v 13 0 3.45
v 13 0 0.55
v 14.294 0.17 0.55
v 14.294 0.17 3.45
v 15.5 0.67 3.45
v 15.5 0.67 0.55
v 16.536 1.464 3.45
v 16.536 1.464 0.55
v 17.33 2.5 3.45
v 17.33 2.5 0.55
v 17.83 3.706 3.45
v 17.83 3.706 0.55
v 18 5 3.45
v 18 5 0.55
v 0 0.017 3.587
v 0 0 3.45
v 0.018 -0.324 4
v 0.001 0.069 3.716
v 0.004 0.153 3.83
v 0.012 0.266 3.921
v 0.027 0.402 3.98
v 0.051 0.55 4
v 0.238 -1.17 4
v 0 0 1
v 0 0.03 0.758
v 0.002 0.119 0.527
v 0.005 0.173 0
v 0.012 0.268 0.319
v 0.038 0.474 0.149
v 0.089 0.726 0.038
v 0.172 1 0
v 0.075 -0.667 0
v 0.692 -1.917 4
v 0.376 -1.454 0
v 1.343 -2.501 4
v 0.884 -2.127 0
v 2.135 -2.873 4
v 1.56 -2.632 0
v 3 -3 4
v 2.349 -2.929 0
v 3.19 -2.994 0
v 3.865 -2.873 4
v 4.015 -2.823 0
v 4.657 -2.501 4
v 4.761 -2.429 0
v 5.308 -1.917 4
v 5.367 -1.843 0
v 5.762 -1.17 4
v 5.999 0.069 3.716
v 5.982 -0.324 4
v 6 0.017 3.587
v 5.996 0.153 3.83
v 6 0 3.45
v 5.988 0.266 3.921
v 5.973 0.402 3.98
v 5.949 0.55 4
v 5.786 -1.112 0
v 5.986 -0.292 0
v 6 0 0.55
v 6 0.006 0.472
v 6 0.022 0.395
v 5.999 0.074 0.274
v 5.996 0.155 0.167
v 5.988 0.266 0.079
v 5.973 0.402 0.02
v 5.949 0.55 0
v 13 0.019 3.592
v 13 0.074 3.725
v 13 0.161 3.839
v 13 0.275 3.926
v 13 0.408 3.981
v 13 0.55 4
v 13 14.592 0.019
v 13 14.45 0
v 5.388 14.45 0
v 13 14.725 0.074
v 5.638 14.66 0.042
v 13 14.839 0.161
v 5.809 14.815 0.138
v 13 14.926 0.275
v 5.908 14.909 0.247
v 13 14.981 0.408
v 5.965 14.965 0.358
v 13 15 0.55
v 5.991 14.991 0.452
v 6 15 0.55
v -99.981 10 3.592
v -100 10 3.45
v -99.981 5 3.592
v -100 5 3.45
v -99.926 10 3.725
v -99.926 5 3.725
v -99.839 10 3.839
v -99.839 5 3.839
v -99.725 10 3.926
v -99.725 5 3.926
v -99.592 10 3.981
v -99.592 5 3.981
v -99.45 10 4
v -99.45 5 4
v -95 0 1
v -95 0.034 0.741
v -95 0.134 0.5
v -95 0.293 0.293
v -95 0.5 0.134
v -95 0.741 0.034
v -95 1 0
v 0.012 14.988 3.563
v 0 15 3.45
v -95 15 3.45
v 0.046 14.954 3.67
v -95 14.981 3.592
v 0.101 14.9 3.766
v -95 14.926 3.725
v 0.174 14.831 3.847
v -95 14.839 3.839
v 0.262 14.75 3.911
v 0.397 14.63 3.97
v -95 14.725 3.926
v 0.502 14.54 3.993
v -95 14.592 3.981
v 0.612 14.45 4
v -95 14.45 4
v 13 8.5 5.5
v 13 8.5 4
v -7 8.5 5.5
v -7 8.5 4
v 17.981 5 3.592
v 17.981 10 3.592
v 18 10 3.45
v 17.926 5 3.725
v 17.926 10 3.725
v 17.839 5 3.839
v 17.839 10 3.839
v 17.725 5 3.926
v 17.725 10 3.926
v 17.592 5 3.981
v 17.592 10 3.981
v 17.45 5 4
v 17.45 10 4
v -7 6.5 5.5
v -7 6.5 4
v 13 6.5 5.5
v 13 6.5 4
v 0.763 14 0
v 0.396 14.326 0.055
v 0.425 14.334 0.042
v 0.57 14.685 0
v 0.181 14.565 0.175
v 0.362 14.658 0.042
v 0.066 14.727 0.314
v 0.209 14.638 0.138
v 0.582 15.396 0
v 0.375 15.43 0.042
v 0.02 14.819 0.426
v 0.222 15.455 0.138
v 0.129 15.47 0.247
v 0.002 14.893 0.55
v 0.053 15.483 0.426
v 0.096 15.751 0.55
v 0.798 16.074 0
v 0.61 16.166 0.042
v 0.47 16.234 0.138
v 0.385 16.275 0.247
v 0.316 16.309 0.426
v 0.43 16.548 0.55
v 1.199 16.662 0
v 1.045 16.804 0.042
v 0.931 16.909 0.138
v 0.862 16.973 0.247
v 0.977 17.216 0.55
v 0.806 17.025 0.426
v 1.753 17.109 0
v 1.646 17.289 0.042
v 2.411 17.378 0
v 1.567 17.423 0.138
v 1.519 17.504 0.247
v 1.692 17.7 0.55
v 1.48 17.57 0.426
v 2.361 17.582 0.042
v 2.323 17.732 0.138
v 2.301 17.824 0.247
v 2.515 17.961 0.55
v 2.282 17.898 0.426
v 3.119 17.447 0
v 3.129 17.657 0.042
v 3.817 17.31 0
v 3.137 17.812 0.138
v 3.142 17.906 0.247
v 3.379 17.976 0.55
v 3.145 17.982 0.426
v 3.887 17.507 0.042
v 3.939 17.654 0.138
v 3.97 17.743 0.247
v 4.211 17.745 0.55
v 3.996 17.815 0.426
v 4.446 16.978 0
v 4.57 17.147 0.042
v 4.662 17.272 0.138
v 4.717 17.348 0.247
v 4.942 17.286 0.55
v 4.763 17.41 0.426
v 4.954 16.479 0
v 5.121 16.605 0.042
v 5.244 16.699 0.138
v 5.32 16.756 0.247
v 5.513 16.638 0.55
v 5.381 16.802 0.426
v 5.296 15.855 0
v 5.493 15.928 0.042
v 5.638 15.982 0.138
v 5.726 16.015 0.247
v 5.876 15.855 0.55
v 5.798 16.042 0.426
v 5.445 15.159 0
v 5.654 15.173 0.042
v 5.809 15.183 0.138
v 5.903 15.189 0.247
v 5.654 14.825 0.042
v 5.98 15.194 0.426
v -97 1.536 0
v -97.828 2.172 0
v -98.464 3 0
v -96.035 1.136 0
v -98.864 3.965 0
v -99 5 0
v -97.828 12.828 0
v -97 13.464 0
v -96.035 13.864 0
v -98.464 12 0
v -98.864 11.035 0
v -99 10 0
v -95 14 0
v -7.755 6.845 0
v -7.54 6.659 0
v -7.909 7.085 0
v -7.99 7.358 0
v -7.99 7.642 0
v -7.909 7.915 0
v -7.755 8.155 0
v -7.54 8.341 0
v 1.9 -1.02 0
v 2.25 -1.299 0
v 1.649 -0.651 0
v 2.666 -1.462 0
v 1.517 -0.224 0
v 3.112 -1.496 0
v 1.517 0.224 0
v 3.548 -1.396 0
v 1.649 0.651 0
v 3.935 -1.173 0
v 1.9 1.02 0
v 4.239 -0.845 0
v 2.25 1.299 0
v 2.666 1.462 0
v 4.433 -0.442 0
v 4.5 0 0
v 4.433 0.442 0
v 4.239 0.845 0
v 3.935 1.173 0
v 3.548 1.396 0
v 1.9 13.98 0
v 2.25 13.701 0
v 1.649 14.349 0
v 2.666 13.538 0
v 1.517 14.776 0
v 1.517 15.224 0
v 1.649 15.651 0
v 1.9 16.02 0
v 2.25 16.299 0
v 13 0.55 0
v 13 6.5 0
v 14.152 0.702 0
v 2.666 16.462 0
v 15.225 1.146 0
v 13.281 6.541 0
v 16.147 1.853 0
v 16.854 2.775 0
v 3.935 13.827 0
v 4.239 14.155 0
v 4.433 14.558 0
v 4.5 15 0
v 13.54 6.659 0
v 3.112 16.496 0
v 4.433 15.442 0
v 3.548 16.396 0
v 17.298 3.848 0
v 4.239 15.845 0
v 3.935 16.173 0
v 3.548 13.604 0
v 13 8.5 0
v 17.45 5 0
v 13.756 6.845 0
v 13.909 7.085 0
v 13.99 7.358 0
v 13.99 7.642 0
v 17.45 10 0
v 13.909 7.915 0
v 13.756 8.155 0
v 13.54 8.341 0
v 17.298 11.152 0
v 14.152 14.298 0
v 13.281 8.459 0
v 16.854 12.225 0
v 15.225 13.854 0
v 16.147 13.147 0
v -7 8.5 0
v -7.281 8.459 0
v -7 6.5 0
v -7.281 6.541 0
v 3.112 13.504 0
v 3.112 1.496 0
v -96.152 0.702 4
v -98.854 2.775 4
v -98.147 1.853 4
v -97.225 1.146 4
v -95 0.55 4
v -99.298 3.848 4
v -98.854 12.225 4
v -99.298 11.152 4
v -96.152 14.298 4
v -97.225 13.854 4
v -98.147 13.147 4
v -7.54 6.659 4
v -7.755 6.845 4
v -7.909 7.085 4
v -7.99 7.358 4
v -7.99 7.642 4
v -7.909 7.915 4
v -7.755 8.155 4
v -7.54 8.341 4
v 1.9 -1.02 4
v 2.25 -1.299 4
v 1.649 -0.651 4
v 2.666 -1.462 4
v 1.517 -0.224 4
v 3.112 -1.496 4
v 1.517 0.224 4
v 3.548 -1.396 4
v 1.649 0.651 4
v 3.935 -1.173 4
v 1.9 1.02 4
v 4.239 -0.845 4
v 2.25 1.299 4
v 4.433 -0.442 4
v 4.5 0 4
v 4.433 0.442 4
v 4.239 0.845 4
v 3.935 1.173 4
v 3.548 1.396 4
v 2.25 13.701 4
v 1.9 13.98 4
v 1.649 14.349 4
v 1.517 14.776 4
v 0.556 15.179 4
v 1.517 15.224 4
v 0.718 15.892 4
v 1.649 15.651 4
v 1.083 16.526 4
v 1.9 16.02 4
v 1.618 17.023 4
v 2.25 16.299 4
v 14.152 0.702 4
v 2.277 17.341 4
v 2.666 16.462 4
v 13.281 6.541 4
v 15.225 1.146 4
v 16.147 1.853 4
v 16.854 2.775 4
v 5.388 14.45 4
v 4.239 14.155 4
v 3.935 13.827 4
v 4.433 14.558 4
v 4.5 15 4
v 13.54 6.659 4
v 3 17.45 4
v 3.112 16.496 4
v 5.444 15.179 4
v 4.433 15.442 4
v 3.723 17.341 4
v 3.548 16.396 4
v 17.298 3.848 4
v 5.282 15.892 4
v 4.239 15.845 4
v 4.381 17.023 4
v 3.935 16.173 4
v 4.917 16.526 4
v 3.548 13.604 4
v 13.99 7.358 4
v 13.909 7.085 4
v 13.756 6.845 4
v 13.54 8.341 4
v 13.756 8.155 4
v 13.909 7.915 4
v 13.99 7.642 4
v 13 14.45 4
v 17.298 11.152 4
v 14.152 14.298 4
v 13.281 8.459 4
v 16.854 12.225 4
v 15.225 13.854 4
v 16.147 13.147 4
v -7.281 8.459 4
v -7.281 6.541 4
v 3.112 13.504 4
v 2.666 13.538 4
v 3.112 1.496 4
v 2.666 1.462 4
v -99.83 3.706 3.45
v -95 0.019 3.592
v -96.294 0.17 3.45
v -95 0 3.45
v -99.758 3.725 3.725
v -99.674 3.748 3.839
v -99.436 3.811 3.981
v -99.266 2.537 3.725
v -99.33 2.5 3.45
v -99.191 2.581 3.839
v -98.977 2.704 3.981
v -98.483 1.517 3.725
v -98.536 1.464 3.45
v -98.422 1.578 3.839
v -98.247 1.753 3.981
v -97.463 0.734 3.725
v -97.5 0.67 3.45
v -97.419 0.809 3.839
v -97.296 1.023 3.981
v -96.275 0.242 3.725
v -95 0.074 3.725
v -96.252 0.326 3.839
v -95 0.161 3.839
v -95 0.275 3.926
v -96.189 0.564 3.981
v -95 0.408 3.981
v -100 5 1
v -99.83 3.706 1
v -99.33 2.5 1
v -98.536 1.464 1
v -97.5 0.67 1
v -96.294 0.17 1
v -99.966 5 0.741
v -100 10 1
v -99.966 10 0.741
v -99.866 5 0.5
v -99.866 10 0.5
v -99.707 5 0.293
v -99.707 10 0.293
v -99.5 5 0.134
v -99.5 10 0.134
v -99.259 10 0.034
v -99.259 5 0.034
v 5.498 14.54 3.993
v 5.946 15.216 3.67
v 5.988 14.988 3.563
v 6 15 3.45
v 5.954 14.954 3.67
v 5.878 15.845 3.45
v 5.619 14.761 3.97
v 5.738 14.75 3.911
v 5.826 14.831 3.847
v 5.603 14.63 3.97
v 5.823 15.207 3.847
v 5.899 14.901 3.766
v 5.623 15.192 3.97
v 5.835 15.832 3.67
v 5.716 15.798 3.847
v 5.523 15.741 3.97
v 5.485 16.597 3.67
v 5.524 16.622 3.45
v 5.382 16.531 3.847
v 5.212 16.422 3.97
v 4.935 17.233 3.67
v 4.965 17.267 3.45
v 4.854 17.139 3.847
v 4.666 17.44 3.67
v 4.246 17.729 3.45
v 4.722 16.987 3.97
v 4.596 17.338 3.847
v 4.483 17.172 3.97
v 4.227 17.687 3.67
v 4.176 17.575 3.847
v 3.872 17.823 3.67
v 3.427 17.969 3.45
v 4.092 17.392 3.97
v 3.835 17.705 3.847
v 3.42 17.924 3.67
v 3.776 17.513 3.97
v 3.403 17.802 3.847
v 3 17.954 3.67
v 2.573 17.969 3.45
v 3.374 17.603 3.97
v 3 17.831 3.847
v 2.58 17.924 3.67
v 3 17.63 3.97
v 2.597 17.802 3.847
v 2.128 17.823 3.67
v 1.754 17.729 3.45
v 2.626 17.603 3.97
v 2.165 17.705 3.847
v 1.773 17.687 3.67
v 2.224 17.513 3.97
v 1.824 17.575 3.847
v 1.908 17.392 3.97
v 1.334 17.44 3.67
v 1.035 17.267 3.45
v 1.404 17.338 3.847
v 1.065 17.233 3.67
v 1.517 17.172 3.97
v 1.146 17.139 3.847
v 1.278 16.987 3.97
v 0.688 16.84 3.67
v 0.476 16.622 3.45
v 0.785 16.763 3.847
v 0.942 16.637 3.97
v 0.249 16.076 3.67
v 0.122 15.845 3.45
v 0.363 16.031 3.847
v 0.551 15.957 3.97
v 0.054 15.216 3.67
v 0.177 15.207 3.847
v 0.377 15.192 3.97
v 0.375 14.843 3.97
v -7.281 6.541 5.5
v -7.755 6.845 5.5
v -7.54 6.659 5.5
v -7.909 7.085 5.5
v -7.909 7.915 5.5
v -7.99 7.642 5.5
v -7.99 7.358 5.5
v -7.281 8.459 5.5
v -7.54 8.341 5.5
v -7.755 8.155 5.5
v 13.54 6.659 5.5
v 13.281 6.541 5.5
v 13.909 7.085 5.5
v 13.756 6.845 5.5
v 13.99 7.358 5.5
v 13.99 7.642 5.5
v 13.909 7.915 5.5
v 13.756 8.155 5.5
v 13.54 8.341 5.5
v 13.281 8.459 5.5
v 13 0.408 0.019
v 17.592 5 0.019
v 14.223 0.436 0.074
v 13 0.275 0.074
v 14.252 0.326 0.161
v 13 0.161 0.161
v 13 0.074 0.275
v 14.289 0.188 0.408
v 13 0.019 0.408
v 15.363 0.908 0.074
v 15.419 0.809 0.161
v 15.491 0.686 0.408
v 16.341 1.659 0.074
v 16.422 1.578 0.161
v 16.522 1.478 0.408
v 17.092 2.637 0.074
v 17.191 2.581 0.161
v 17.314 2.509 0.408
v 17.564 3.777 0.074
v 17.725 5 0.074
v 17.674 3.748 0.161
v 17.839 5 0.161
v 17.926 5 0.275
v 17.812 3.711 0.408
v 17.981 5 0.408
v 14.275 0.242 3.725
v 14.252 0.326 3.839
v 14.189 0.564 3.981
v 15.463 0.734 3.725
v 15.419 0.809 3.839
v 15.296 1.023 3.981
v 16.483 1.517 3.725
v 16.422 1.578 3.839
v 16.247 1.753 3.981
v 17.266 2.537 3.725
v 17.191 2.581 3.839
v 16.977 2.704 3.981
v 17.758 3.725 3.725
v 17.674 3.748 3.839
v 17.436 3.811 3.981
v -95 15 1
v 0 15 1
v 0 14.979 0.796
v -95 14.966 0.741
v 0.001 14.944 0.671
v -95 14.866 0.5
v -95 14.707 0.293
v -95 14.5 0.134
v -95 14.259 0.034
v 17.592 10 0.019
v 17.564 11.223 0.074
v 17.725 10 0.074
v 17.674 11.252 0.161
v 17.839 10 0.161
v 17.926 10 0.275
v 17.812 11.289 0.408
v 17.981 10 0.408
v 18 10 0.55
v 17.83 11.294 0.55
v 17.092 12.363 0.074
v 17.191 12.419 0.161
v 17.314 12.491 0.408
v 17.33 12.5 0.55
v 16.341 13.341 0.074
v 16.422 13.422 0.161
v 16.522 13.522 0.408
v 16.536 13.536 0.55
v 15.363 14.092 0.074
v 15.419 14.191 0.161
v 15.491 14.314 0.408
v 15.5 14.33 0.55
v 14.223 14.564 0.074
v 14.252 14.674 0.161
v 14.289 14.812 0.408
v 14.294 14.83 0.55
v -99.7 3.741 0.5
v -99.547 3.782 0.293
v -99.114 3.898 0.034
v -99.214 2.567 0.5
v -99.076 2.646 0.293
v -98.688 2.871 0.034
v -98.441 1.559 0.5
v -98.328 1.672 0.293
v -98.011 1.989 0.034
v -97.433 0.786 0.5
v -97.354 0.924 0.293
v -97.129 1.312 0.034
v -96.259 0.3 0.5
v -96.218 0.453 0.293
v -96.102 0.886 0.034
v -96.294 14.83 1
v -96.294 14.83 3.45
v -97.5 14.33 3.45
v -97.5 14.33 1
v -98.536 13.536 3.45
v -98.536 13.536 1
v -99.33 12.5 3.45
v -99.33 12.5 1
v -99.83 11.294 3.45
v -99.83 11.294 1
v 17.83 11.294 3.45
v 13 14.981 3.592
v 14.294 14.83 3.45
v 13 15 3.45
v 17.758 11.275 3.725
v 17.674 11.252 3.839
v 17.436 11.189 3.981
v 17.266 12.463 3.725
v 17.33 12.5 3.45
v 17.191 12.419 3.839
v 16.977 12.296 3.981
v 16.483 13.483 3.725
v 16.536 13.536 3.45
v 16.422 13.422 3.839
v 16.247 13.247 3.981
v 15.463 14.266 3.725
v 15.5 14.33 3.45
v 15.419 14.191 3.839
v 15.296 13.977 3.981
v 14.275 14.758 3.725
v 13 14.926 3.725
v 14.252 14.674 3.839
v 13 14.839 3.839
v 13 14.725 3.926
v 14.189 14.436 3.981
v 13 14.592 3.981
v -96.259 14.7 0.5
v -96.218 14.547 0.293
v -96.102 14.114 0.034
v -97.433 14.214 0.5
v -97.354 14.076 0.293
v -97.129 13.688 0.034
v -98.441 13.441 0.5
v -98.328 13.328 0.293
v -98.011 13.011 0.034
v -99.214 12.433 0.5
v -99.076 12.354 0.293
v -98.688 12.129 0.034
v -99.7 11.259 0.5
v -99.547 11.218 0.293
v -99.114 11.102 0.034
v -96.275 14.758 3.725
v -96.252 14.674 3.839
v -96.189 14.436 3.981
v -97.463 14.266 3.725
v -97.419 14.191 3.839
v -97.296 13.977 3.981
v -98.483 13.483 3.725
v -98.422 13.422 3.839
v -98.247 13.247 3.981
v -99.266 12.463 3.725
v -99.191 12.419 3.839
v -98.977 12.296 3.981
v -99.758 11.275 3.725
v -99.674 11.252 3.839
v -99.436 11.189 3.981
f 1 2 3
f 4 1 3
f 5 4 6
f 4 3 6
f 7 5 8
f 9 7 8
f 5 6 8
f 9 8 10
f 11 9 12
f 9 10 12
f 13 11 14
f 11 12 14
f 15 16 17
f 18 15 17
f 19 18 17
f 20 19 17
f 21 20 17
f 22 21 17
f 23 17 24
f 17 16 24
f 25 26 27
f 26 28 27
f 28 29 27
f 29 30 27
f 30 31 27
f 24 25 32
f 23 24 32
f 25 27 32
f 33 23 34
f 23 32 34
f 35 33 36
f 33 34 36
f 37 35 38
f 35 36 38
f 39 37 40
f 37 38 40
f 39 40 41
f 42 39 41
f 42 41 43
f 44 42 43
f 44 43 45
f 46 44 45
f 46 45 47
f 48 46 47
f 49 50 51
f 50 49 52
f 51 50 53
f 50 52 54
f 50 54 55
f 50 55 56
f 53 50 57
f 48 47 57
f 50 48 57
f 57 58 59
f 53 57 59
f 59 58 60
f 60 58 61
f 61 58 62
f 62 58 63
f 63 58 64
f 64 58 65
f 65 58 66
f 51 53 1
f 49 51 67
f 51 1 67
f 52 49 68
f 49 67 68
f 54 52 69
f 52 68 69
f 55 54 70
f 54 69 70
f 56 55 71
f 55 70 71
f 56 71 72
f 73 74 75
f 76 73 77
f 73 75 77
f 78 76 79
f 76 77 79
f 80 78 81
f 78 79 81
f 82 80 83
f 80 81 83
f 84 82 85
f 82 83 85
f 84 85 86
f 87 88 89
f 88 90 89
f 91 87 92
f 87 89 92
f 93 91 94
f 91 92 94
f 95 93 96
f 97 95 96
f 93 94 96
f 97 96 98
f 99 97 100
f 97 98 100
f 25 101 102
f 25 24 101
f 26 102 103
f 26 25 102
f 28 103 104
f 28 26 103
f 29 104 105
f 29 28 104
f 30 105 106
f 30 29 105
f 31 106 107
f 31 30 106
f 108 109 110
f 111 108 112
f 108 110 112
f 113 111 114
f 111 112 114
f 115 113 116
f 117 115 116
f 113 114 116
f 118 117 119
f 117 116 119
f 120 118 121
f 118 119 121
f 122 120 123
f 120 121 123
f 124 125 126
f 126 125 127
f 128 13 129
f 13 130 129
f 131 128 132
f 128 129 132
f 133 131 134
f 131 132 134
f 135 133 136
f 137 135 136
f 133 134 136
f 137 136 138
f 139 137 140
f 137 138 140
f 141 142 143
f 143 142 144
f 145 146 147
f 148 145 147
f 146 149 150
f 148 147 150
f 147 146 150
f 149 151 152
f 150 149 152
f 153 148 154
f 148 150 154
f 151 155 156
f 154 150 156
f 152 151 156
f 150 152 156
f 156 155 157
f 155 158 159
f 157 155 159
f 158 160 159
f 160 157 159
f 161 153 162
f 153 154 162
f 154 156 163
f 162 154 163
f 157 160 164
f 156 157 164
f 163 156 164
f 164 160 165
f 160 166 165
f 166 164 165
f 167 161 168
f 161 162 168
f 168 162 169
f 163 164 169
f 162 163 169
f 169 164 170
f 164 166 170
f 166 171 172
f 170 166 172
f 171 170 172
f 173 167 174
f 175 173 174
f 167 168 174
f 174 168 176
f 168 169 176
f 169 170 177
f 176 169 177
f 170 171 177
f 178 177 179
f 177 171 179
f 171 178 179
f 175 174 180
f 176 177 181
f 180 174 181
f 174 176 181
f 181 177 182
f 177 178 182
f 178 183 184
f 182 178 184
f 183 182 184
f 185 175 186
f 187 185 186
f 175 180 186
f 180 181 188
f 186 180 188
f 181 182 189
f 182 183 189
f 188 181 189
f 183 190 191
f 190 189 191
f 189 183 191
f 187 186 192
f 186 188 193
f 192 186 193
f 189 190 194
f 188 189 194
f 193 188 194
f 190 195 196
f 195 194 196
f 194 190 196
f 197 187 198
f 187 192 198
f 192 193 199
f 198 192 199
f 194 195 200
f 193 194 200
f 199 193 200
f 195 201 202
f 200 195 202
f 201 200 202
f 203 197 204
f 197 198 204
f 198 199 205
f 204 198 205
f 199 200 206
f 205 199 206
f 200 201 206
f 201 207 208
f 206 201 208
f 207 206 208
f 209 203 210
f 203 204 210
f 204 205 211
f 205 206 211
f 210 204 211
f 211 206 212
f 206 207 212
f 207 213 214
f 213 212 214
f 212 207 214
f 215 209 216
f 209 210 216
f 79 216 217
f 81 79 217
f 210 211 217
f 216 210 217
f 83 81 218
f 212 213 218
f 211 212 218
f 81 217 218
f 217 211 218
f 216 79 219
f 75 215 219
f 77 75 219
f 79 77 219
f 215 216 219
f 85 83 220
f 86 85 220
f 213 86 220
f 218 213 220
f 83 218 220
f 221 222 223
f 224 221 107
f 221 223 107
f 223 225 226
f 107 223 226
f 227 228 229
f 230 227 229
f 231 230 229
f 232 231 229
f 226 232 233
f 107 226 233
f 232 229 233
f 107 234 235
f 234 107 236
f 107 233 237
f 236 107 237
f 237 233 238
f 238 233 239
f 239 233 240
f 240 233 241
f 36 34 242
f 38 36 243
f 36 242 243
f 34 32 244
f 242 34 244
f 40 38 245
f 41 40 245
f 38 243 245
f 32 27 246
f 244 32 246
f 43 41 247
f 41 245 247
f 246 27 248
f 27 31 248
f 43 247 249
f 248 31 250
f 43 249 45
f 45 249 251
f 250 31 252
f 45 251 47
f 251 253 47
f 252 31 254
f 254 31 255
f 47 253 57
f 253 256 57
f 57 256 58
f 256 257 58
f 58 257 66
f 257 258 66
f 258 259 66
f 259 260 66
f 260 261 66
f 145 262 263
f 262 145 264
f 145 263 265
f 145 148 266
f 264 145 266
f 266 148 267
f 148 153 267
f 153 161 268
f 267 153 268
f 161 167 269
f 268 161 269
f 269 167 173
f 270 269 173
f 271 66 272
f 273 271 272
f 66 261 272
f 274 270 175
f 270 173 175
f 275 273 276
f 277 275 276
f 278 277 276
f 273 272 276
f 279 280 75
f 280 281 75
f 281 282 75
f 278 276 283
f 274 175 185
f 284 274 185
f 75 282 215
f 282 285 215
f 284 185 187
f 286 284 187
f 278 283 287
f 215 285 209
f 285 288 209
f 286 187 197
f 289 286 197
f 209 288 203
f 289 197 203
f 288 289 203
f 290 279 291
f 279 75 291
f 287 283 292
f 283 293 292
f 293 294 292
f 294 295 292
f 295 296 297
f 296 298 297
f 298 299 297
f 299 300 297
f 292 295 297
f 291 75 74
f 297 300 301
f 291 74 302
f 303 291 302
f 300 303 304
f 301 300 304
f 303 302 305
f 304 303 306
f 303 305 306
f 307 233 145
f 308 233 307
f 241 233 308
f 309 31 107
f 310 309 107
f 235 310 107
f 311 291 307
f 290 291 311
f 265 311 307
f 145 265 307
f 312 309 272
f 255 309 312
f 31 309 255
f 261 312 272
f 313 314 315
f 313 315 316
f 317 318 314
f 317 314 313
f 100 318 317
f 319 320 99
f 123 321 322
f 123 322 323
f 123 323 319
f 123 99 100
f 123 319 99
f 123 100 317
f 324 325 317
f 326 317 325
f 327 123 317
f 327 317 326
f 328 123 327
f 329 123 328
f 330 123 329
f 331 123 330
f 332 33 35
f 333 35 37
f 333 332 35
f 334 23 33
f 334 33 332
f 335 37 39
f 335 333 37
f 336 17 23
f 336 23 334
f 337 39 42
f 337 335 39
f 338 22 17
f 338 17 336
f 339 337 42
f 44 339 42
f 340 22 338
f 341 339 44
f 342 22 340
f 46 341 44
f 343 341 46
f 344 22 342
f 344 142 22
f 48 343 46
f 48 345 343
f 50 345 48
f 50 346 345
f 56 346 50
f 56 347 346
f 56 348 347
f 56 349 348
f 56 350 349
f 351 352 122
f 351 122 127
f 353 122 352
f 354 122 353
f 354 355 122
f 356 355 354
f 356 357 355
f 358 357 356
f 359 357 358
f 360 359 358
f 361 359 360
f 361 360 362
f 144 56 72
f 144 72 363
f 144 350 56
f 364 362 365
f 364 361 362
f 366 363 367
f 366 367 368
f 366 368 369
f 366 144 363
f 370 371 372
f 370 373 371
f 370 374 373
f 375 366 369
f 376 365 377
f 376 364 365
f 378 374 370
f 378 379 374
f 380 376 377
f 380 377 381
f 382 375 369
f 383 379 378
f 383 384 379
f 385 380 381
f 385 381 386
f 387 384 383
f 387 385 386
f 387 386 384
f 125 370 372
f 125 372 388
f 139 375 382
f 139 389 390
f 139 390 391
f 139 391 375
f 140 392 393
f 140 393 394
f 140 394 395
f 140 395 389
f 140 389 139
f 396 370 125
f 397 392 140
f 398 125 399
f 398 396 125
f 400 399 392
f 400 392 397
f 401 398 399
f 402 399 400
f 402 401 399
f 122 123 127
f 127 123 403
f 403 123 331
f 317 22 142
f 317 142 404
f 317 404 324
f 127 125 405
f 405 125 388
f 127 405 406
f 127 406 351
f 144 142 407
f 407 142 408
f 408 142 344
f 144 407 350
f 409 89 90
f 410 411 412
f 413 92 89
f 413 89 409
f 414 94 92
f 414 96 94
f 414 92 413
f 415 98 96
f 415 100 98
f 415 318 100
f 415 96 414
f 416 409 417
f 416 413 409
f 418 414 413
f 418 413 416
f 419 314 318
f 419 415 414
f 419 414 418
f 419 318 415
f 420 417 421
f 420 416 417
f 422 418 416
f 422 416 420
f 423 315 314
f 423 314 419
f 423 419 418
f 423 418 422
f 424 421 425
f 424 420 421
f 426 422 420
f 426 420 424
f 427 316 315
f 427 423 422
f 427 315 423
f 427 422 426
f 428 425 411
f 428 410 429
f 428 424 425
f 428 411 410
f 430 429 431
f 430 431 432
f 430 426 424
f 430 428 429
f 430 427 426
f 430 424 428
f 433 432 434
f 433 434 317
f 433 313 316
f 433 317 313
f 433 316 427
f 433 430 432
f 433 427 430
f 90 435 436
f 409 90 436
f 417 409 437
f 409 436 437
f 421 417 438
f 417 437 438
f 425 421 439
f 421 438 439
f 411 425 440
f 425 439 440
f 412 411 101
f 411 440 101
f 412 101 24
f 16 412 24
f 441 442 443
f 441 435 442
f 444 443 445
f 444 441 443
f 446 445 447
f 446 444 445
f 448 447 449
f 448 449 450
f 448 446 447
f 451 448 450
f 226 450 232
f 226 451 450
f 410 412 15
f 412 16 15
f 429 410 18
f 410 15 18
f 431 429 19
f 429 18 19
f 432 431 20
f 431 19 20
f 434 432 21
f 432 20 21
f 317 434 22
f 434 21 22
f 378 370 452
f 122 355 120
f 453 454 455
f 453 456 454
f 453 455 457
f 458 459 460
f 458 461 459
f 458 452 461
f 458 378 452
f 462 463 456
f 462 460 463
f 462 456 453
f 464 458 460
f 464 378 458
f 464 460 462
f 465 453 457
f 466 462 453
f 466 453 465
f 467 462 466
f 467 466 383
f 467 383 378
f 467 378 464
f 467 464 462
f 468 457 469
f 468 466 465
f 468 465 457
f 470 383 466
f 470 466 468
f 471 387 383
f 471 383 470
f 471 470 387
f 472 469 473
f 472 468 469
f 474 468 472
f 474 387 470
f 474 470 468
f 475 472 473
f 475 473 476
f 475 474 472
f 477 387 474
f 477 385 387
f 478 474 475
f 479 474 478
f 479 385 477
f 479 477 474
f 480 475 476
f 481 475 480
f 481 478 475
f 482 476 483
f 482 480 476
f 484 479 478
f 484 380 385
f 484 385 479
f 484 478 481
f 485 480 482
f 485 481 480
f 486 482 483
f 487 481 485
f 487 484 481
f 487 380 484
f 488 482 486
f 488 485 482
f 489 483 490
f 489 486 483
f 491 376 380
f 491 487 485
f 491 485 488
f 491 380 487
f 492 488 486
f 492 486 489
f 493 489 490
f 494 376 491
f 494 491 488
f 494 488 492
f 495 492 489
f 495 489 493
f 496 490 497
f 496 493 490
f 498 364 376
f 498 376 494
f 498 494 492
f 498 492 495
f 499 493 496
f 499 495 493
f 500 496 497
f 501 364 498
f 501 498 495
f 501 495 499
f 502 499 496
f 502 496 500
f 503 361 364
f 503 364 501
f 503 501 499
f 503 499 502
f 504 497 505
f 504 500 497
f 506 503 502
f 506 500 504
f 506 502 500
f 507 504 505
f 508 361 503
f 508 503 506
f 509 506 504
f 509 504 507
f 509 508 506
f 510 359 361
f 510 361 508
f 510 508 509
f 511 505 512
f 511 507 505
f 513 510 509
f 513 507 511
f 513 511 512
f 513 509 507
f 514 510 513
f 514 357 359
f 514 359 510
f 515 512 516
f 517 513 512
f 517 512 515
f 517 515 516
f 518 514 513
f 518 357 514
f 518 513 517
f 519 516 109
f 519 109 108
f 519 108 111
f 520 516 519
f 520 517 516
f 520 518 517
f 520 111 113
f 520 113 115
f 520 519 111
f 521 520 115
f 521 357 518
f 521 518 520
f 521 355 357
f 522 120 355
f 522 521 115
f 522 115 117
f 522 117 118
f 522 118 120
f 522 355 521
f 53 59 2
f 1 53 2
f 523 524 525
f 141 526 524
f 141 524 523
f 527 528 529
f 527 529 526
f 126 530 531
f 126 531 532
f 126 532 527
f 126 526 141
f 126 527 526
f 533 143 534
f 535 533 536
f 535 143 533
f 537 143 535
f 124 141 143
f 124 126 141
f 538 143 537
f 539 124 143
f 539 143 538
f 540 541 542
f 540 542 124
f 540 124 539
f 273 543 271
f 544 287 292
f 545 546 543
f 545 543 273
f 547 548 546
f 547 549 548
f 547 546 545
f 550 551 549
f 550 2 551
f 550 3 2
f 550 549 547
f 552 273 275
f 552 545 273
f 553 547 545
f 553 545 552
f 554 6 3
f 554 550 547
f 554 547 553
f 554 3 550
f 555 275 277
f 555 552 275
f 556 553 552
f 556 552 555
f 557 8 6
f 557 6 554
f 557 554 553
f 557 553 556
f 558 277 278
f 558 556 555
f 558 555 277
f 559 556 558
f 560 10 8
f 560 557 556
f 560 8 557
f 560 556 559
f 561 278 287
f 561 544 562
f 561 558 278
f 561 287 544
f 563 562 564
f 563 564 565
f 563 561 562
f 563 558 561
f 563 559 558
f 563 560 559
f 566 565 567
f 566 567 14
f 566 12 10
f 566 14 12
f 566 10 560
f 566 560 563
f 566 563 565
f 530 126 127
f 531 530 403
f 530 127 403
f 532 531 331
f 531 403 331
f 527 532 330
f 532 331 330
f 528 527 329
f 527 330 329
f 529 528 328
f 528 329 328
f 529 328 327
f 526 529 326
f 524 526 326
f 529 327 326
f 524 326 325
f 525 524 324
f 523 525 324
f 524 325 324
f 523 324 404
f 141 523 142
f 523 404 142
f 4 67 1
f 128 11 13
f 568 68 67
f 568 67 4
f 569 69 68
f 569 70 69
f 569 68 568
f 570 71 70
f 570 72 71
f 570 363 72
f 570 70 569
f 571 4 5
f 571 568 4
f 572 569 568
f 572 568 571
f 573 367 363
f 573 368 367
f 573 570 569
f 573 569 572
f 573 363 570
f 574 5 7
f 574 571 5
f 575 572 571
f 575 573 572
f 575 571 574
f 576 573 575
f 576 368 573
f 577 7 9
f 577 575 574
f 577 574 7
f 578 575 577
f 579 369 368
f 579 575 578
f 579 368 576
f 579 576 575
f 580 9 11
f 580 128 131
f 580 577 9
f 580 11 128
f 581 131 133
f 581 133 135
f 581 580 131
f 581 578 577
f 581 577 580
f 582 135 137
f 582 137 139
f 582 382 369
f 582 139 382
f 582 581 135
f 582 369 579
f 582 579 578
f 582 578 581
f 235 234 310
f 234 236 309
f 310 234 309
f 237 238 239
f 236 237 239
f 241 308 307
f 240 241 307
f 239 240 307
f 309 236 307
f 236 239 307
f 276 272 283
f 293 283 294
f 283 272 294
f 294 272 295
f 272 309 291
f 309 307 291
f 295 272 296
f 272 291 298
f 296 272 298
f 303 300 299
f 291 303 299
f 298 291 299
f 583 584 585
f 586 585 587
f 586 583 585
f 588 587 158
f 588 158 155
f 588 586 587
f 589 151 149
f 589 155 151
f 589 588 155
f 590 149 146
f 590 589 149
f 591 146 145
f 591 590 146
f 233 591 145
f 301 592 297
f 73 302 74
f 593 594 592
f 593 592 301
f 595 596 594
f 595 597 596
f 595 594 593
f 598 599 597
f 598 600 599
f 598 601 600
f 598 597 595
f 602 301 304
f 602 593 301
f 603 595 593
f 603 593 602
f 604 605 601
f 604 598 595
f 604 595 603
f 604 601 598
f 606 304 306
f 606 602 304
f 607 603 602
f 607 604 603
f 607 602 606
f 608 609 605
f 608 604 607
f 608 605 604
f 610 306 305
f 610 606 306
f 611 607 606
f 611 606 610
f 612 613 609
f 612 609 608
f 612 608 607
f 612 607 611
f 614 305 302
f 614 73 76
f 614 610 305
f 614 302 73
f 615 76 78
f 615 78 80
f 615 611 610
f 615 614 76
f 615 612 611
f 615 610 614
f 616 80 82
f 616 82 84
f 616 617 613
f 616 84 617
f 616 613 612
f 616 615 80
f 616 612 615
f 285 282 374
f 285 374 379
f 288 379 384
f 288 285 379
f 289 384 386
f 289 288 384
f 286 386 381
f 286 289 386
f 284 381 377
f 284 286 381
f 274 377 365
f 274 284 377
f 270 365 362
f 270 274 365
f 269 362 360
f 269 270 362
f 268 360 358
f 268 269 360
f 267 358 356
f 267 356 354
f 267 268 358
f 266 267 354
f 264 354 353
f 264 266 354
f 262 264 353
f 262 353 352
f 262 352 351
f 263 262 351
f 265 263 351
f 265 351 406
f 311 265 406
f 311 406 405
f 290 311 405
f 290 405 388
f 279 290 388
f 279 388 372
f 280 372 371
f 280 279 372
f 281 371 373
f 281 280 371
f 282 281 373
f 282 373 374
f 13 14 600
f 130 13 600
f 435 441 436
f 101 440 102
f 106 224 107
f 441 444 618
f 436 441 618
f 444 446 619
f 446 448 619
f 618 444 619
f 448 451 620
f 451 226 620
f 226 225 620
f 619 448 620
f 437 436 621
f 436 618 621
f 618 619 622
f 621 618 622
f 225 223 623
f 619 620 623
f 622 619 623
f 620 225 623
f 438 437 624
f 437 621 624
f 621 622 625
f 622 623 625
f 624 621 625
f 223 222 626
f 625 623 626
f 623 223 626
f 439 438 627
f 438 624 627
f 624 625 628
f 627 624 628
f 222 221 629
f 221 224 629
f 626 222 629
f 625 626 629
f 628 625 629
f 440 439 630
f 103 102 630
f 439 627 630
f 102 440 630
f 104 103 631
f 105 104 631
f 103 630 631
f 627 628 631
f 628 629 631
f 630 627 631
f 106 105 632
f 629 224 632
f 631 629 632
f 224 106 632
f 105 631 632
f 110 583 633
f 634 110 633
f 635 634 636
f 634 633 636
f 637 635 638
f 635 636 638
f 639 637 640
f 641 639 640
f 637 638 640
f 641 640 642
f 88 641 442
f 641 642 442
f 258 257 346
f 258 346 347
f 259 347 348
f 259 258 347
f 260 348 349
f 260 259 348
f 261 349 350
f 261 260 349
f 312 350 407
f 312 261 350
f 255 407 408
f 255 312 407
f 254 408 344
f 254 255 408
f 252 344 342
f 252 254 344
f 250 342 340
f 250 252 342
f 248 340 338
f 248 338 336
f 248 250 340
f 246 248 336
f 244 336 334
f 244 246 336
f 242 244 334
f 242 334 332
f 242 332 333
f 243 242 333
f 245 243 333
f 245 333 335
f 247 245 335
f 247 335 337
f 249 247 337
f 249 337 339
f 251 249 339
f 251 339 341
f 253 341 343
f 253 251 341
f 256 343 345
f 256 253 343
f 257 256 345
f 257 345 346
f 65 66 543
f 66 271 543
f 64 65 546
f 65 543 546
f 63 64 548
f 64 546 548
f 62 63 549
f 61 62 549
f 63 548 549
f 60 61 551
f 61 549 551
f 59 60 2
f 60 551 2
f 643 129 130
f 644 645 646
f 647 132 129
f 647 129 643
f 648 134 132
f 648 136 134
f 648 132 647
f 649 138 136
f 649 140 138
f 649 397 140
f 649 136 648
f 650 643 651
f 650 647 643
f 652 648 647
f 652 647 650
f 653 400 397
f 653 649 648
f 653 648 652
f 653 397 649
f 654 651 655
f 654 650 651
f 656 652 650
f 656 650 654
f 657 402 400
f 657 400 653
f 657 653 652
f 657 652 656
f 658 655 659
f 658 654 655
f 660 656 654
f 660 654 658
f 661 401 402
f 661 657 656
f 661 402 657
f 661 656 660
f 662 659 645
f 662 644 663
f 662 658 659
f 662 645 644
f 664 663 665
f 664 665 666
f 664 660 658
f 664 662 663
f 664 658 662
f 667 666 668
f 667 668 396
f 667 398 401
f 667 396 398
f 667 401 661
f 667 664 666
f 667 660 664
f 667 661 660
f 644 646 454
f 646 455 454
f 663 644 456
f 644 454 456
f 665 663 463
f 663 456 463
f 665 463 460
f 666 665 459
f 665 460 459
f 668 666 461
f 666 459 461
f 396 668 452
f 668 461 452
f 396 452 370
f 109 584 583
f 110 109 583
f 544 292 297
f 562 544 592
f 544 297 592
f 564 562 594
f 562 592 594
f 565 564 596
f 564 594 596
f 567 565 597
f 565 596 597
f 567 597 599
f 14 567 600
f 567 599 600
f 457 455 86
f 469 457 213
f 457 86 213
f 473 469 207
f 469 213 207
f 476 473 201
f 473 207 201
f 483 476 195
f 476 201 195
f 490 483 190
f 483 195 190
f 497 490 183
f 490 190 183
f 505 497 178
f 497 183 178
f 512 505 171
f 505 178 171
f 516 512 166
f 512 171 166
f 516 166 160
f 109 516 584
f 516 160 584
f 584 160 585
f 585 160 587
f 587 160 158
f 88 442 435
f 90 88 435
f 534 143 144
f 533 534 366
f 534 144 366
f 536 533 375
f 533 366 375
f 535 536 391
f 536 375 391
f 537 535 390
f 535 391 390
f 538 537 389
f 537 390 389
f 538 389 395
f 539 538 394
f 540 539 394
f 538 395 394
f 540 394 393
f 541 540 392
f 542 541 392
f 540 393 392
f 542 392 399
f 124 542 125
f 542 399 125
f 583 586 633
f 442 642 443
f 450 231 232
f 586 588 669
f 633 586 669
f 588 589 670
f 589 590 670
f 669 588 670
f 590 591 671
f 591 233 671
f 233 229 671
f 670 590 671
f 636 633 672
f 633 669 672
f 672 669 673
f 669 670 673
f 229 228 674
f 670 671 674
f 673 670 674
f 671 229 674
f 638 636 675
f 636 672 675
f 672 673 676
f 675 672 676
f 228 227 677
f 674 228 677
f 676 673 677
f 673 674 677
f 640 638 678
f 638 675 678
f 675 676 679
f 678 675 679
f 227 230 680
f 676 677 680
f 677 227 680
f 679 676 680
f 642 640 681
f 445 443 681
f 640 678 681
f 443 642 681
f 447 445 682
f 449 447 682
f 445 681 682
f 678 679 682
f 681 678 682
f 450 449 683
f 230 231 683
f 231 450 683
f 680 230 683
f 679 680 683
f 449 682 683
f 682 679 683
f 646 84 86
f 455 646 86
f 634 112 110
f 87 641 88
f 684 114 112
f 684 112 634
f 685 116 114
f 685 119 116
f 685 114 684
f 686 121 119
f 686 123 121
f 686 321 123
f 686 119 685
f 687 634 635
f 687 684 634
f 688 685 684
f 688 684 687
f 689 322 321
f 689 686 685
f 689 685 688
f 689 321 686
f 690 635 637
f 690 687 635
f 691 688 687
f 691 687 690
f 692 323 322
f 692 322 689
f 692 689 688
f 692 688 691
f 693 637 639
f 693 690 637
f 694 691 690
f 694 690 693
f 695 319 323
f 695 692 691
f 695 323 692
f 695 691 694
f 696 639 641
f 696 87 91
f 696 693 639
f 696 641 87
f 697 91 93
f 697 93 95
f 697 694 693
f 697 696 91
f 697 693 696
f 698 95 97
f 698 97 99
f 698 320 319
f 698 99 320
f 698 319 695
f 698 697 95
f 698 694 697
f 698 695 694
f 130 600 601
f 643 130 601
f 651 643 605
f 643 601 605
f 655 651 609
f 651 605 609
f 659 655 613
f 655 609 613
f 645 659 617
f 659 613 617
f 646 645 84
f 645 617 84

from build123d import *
from build123d import SkipClean  # not in build123d's __all__

# Parameters (mm, degrees)
F0_R     = 1.5
F1_DEPTH = 4
F2_R     = 0.55
F3_R     = 1
F4_R     = 0.5499
F6_DEPTH = 5.5


# Not quite as in the source:
# - a fillet or chamfer is up to 0.001 mm smaller than in the source, because OpenCascade refuses the exact size
# - a feature names something its author has since deleted; it is built from what else it names


with BuildPart() as f1:
    # F0 (on Top) → F1 (new body)
    with BuildSketch(Plane.XY):
        with BuildLine():
            Line((-95, 0), (0, 0))
            ThreePointArc((0, 0), (3, -3), (6, 0))
            Line((6, 0), (13, 0))
            ThreePointArc((13, 0), (16.5355339059, 1.4644660941), (18, 5))
            Line((18, 5), (18, 10))
            ThreePointArc((18, 10), (16.5355339059, 13.5355339059), (13, 15))
            Line((13, 15), (6, 15))
            ThreePointArc((6, 15), (3, 18), (0, 15))
            Line((0, 15), (-95, 15))
            ThreePointArc((-95, 15), (-98.5355339059, 13.5355339059), (-100, 10))
            Line((-100, 10), (-100, 5))
            ThreePointArc((-100, 5), (-98.5355339059, 1.4644660941), (-95, 0))
        make_face()
        with Locations((3, 0)):
            Circle(F0_R, mode=Mode.SUBTRACT)
        with Locations((3, 15)):
            Circle(F0_R, mode=Mode.SUBTRACT)
    extrude(amount=F1_DEPTH)

    # F2
    f2_edges = [f1.edges().sort_by_distance(p)[0] for p in [
        (-47.5, 0, 4),
    ]]
    fillet(f2_edges, radius=F2_R)

    # F3
    f3_edges = [f1.edges().sort_by_distance(p)[0] for p in [
        (-47.5, 0, 0),
    ]]
    fillet(f3_edges, radius=F3_R)

    # F4 (radius 0.55 in the source; OpenCascade refuses exactly that, so slightly less here)
    f4_edges = [f1.edges().sort_by_distance(p)[0] for p in [
        (3, 18, 4),
        (3, 18, 0),
        (9.5, 0, 4),
        (16.535534, 13.535534, 4),
        (16.535534, 1.464466, 4),
        (16.535534, 13.535534, 0),
        (16.535534, 1.464466, 0),
        (9.5, 0, 0),
        (9.5, 15, 0),
        (9.5, 15, 4),
    ]]
    fillet(f4_edges, radius=F4_R)

    # F5 (on Top) → F6 (join)
    with BuildSketch(Plane.XY):
        with BuildLine():
            Line((12.9997539334, 8.5000049546), (-6.9997087121, 8.5000049546))
            ThreePointArc((-6.9997087121, 8.5000049546), (-7.9997087121, 7.5000049546), (-6.9997087121, 6.5000049546))
            Line((-6.9997087121, 6.5000049546), (12.9997539334, 6.5000049546))
            ThreePointArc((12.9997539334, 6.5000049546), (13.9997539334, 7.5000049546), (12.9997539334, 8.5000049546))
        make_face()
    with SkipClean():  # cleaning this boolean's faces spoils the solid; the shape is the same uncleaned
        extrude(amount=F6_DEPTH)


solid = f1.part
